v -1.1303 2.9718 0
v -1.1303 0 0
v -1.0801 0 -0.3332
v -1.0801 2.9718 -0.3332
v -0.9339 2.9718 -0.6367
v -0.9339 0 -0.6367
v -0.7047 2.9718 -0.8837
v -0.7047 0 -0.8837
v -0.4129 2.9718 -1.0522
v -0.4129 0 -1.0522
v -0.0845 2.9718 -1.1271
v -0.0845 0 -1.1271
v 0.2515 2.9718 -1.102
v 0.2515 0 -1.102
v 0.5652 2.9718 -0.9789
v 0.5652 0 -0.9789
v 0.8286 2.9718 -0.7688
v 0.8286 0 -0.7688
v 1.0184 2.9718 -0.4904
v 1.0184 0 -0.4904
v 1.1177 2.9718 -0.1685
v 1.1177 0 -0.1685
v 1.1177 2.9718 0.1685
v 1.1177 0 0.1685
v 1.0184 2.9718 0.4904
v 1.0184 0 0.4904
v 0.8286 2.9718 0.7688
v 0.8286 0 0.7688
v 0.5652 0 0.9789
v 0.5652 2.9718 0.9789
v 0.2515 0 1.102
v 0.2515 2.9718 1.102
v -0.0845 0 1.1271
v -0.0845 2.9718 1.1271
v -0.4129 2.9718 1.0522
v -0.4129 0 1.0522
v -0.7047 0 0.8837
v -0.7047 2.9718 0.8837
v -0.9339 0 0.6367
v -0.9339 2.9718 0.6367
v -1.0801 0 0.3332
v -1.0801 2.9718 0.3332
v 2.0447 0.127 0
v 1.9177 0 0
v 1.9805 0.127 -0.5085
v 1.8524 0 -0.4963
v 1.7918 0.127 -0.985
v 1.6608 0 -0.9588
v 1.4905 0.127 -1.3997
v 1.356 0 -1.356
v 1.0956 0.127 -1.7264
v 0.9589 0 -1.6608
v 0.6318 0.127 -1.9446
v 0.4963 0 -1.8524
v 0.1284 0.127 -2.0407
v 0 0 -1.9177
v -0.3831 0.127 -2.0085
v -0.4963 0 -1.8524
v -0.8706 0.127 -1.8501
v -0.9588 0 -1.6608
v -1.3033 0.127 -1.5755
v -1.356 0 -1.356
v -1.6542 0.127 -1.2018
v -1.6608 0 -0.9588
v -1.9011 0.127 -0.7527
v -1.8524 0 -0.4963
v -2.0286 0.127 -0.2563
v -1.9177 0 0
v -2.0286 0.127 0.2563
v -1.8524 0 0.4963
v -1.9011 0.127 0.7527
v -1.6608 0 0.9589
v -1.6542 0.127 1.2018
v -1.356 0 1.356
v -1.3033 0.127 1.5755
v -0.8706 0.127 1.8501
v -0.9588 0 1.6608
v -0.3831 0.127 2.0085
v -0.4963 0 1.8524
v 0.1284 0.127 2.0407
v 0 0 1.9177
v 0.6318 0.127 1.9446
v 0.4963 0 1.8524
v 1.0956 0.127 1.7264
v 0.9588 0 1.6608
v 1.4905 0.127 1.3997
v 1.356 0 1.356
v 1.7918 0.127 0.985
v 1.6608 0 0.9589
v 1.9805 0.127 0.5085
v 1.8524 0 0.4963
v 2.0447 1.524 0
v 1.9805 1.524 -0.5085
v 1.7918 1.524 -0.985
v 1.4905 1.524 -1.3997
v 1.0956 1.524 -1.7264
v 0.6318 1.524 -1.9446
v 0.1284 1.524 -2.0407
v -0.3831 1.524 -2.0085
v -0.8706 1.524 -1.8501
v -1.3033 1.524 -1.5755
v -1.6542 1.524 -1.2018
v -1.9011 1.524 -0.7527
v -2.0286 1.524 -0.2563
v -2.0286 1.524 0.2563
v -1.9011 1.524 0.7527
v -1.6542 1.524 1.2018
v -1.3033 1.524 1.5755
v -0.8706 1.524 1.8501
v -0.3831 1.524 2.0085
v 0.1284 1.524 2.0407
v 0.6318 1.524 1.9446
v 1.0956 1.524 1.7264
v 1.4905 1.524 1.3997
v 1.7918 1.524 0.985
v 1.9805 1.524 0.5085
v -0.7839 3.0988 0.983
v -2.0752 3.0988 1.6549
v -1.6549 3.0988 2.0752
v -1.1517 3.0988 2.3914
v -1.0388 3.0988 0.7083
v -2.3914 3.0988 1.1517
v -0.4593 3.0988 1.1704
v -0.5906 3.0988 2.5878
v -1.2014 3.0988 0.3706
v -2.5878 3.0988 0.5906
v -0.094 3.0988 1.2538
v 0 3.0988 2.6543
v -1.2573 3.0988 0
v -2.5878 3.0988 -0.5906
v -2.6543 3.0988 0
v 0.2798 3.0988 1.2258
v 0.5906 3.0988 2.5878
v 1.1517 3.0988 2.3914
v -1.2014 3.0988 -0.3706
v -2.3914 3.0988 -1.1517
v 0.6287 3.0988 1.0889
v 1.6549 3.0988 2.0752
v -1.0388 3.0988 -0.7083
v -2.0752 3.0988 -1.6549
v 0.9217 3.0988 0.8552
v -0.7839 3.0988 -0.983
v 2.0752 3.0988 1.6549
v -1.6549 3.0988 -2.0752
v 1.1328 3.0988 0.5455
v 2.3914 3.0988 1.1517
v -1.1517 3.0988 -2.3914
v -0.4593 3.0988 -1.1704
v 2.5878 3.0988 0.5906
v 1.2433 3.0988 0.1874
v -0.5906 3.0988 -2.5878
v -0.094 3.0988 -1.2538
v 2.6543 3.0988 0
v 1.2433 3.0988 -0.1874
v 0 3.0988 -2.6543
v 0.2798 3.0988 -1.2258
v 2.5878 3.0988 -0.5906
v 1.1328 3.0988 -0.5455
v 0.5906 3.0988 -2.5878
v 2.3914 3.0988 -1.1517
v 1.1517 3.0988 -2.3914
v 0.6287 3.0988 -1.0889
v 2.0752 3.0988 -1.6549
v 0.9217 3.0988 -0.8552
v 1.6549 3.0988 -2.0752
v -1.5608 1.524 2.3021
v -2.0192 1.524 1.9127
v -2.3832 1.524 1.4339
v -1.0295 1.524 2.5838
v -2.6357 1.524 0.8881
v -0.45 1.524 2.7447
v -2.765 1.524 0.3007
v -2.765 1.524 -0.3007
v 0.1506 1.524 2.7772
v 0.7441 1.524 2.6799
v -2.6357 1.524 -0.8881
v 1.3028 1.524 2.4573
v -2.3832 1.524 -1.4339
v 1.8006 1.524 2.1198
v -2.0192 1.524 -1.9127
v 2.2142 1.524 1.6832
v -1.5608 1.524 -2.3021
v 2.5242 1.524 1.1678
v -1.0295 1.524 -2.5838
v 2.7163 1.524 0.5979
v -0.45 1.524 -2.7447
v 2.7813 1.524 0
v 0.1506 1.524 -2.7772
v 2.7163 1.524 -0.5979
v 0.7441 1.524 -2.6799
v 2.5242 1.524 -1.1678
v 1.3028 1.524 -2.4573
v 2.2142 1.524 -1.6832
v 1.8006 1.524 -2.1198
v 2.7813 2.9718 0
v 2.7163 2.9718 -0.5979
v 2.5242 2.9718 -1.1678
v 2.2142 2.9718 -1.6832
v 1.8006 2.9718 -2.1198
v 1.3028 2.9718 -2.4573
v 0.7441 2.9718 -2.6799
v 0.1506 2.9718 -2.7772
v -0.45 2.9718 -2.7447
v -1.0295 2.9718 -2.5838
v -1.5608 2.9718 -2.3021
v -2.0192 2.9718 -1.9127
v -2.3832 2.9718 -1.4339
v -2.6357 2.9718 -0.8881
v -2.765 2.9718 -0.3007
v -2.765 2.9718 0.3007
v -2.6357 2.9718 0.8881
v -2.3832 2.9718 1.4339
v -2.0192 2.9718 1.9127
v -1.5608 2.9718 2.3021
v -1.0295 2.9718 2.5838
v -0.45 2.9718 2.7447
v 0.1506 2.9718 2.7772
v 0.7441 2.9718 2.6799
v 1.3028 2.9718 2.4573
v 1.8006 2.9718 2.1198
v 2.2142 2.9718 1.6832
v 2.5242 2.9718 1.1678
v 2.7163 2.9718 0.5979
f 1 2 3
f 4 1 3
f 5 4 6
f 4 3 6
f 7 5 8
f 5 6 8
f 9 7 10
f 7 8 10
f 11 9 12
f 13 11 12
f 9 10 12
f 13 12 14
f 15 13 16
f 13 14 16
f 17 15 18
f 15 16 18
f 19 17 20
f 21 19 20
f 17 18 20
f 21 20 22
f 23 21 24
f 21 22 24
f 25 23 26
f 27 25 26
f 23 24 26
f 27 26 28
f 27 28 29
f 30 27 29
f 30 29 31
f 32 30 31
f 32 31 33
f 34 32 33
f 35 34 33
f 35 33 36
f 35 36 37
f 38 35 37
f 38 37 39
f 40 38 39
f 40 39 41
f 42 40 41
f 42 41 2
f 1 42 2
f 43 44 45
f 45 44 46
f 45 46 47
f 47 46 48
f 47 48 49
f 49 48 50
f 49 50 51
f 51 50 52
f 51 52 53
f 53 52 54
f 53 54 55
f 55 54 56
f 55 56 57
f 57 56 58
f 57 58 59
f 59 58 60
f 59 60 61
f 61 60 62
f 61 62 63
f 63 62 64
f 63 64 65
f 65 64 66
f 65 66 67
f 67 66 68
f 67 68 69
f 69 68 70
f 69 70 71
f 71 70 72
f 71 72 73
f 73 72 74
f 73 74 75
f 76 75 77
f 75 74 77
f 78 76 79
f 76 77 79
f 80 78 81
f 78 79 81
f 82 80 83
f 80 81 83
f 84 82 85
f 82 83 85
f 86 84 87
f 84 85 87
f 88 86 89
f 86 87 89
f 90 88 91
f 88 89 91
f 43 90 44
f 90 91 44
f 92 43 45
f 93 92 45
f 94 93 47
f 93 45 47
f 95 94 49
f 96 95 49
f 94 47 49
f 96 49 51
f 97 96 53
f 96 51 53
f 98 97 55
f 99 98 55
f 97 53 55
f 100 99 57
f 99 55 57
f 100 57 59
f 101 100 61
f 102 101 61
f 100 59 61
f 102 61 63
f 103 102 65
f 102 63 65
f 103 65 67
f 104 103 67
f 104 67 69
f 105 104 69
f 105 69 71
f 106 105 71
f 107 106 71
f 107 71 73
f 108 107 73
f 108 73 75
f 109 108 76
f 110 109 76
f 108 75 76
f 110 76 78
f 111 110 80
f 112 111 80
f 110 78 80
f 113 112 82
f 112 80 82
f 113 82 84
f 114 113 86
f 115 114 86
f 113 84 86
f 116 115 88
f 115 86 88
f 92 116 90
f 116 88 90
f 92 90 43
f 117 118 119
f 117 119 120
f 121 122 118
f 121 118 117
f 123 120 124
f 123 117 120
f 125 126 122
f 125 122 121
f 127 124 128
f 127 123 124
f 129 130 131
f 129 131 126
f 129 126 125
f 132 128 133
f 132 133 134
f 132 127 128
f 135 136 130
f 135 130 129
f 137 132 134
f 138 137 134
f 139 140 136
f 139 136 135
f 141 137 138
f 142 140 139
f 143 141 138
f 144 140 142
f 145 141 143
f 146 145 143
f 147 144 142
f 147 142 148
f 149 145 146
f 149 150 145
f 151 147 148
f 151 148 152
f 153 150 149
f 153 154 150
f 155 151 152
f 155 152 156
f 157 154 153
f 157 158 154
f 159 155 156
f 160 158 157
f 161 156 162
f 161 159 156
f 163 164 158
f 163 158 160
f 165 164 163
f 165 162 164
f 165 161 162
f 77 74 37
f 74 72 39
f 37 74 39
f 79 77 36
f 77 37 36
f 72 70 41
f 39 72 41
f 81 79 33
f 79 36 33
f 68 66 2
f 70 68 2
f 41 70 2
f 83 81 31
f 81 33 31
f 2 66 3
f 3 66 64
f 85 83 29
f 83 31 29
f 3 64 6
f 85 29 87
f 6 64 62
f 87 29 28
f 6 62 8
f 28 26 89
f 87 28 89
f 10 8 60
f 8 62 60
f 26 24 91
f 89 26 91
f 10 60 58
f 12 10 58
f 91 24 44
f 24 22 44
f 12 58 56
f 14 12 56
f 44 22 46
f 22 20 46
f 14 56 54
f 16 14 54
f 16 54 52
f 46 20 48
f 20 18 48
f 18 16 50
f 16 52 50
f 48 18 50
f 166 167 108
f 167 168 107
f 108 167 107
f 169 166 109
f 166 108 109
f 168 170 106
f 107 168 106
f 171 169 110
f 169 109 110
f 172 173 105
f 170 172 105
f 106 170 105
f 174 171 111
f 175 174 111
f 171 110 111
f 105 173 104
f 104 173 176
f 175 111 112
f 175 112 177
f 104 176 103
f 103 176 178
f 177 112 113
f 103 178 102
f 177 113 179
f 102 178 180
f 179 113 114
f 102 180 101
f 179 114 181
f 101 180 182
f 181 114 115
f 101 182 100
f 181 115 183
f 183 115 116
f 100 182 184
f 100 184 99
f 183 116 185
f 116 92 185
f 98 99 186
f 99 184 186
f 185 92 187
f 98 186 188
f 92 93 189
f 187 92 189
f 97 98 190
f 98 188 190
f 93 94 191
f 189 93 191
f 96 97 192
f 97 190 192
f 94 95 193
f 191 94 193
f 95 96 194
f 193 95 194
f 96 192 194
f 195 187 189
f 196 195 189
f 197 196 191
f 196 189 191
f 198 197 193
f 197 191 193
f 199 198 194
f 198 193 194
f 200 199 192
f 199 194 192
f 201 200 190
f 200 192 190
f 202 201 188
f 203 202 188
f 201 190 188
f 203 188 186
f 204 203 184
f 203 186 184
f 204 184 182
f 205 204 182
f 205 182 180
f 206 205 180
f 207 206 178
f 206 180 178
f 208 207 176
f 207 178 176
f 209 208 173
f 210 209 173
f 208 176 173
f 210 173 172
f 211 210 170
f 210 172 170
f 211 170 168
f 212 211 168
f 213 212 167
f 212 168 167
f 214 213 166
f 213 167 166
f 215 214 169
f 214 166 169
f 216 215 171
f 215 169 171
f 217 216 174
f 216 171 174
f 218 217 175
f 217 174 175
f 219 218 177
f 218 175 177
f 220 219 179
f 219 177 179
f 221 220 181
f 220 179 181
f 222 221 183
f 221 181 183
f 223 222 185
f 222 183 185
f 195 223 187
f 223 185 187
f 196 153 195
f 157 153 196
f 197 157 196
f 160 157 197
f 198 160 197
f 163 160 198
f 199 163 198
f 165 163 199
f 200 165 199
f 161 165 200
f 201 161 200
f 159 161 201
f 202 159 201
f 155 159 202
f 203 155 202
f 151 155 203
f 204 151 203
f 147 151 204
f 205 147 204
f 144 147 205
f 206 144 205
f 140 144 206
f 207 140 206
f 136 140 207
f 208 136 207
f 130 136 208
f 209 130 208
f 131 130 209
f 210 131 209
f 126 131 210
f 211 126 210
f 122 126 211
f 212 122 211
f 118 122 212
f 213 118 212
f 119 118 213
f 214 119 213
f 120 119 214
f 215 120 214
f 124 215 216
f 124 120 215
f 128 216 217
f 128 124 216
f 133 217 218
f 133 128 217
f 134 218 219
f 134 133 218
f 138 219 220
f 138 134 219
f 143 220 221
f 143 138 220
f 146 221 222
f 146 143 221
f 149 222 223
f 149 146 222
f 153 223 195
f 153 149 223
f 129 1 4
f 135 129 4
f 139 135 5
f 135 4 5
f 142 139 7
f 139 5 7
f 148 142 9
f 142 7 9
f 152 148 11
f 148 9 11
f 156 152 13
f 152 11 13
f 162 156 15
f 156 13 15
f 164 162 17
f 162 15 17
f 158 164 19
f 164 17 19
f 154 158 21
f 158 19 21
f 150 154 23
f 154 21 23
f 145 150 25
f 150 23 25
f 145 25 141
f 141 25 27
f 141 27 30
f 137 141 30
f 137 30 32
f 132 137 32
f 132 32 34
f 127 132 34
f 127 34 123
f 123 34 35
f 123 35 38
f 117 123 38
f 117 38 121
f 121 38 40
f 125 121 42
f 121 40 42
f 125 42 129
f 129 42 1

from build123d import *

# Parameters (mm, degrees)
SKETCH1_R             = 2.0447
BOSS_EXTRUDE1_DEPTH   = 1.524
SKETCH2_R             = 2.7813
BOSS_EXTRUDE2_DEPTH   = 1.5748
F_4_40_TAPPED_HOLE1_D = 2.2606
CHAMFER1_SIZE         = 0.127


with BuildPart() as part:
    # Sketch1 → Boss-Extrude1 (new body)
    with BuildSketch(Plane(origin=(0, 0, 0), x_dir=(1, 0, 0), z_dir=(0, 1, 0))):
        Circle(SKETCH1_R)
    extrude(amount=BOSS_EXTRUDE1_DEPTH)

    # Sketch2 → Boss-Extrude2 (add)
    with BuildSketch(Plane(origin=(0, 1.524, 0), x_dir=(1, 0, 0), z_dir=(0, 1, 0))):
        Circle(SKETCH2_R)
    extrude(amount=BOSS_EXTRUDE2_DEPTH)

    # #4-40 Tapped Hole1 (through all)
    with Locations(Plane(origin=(0, 3.0988, 0), x_dir=(1, 0, 0), z_dir=(0, 1, 0))):
        with Locations((0, 0)):
            Hole(F_4_40_TAPPED_HOLE1_D / 2)

    # Chamfer1
    chamfer1_edges = [part.edges().sort_by_distance(p)[0] for p in [
        (1.1303, 3.0988, 0),
        (-2.0447, 0, 0),
        (-2.7813, 3.0988, 0),
    ]]
    chamfer(chamfer1_edges, length=CHAMFER1_SIZE)


solid = part.part
